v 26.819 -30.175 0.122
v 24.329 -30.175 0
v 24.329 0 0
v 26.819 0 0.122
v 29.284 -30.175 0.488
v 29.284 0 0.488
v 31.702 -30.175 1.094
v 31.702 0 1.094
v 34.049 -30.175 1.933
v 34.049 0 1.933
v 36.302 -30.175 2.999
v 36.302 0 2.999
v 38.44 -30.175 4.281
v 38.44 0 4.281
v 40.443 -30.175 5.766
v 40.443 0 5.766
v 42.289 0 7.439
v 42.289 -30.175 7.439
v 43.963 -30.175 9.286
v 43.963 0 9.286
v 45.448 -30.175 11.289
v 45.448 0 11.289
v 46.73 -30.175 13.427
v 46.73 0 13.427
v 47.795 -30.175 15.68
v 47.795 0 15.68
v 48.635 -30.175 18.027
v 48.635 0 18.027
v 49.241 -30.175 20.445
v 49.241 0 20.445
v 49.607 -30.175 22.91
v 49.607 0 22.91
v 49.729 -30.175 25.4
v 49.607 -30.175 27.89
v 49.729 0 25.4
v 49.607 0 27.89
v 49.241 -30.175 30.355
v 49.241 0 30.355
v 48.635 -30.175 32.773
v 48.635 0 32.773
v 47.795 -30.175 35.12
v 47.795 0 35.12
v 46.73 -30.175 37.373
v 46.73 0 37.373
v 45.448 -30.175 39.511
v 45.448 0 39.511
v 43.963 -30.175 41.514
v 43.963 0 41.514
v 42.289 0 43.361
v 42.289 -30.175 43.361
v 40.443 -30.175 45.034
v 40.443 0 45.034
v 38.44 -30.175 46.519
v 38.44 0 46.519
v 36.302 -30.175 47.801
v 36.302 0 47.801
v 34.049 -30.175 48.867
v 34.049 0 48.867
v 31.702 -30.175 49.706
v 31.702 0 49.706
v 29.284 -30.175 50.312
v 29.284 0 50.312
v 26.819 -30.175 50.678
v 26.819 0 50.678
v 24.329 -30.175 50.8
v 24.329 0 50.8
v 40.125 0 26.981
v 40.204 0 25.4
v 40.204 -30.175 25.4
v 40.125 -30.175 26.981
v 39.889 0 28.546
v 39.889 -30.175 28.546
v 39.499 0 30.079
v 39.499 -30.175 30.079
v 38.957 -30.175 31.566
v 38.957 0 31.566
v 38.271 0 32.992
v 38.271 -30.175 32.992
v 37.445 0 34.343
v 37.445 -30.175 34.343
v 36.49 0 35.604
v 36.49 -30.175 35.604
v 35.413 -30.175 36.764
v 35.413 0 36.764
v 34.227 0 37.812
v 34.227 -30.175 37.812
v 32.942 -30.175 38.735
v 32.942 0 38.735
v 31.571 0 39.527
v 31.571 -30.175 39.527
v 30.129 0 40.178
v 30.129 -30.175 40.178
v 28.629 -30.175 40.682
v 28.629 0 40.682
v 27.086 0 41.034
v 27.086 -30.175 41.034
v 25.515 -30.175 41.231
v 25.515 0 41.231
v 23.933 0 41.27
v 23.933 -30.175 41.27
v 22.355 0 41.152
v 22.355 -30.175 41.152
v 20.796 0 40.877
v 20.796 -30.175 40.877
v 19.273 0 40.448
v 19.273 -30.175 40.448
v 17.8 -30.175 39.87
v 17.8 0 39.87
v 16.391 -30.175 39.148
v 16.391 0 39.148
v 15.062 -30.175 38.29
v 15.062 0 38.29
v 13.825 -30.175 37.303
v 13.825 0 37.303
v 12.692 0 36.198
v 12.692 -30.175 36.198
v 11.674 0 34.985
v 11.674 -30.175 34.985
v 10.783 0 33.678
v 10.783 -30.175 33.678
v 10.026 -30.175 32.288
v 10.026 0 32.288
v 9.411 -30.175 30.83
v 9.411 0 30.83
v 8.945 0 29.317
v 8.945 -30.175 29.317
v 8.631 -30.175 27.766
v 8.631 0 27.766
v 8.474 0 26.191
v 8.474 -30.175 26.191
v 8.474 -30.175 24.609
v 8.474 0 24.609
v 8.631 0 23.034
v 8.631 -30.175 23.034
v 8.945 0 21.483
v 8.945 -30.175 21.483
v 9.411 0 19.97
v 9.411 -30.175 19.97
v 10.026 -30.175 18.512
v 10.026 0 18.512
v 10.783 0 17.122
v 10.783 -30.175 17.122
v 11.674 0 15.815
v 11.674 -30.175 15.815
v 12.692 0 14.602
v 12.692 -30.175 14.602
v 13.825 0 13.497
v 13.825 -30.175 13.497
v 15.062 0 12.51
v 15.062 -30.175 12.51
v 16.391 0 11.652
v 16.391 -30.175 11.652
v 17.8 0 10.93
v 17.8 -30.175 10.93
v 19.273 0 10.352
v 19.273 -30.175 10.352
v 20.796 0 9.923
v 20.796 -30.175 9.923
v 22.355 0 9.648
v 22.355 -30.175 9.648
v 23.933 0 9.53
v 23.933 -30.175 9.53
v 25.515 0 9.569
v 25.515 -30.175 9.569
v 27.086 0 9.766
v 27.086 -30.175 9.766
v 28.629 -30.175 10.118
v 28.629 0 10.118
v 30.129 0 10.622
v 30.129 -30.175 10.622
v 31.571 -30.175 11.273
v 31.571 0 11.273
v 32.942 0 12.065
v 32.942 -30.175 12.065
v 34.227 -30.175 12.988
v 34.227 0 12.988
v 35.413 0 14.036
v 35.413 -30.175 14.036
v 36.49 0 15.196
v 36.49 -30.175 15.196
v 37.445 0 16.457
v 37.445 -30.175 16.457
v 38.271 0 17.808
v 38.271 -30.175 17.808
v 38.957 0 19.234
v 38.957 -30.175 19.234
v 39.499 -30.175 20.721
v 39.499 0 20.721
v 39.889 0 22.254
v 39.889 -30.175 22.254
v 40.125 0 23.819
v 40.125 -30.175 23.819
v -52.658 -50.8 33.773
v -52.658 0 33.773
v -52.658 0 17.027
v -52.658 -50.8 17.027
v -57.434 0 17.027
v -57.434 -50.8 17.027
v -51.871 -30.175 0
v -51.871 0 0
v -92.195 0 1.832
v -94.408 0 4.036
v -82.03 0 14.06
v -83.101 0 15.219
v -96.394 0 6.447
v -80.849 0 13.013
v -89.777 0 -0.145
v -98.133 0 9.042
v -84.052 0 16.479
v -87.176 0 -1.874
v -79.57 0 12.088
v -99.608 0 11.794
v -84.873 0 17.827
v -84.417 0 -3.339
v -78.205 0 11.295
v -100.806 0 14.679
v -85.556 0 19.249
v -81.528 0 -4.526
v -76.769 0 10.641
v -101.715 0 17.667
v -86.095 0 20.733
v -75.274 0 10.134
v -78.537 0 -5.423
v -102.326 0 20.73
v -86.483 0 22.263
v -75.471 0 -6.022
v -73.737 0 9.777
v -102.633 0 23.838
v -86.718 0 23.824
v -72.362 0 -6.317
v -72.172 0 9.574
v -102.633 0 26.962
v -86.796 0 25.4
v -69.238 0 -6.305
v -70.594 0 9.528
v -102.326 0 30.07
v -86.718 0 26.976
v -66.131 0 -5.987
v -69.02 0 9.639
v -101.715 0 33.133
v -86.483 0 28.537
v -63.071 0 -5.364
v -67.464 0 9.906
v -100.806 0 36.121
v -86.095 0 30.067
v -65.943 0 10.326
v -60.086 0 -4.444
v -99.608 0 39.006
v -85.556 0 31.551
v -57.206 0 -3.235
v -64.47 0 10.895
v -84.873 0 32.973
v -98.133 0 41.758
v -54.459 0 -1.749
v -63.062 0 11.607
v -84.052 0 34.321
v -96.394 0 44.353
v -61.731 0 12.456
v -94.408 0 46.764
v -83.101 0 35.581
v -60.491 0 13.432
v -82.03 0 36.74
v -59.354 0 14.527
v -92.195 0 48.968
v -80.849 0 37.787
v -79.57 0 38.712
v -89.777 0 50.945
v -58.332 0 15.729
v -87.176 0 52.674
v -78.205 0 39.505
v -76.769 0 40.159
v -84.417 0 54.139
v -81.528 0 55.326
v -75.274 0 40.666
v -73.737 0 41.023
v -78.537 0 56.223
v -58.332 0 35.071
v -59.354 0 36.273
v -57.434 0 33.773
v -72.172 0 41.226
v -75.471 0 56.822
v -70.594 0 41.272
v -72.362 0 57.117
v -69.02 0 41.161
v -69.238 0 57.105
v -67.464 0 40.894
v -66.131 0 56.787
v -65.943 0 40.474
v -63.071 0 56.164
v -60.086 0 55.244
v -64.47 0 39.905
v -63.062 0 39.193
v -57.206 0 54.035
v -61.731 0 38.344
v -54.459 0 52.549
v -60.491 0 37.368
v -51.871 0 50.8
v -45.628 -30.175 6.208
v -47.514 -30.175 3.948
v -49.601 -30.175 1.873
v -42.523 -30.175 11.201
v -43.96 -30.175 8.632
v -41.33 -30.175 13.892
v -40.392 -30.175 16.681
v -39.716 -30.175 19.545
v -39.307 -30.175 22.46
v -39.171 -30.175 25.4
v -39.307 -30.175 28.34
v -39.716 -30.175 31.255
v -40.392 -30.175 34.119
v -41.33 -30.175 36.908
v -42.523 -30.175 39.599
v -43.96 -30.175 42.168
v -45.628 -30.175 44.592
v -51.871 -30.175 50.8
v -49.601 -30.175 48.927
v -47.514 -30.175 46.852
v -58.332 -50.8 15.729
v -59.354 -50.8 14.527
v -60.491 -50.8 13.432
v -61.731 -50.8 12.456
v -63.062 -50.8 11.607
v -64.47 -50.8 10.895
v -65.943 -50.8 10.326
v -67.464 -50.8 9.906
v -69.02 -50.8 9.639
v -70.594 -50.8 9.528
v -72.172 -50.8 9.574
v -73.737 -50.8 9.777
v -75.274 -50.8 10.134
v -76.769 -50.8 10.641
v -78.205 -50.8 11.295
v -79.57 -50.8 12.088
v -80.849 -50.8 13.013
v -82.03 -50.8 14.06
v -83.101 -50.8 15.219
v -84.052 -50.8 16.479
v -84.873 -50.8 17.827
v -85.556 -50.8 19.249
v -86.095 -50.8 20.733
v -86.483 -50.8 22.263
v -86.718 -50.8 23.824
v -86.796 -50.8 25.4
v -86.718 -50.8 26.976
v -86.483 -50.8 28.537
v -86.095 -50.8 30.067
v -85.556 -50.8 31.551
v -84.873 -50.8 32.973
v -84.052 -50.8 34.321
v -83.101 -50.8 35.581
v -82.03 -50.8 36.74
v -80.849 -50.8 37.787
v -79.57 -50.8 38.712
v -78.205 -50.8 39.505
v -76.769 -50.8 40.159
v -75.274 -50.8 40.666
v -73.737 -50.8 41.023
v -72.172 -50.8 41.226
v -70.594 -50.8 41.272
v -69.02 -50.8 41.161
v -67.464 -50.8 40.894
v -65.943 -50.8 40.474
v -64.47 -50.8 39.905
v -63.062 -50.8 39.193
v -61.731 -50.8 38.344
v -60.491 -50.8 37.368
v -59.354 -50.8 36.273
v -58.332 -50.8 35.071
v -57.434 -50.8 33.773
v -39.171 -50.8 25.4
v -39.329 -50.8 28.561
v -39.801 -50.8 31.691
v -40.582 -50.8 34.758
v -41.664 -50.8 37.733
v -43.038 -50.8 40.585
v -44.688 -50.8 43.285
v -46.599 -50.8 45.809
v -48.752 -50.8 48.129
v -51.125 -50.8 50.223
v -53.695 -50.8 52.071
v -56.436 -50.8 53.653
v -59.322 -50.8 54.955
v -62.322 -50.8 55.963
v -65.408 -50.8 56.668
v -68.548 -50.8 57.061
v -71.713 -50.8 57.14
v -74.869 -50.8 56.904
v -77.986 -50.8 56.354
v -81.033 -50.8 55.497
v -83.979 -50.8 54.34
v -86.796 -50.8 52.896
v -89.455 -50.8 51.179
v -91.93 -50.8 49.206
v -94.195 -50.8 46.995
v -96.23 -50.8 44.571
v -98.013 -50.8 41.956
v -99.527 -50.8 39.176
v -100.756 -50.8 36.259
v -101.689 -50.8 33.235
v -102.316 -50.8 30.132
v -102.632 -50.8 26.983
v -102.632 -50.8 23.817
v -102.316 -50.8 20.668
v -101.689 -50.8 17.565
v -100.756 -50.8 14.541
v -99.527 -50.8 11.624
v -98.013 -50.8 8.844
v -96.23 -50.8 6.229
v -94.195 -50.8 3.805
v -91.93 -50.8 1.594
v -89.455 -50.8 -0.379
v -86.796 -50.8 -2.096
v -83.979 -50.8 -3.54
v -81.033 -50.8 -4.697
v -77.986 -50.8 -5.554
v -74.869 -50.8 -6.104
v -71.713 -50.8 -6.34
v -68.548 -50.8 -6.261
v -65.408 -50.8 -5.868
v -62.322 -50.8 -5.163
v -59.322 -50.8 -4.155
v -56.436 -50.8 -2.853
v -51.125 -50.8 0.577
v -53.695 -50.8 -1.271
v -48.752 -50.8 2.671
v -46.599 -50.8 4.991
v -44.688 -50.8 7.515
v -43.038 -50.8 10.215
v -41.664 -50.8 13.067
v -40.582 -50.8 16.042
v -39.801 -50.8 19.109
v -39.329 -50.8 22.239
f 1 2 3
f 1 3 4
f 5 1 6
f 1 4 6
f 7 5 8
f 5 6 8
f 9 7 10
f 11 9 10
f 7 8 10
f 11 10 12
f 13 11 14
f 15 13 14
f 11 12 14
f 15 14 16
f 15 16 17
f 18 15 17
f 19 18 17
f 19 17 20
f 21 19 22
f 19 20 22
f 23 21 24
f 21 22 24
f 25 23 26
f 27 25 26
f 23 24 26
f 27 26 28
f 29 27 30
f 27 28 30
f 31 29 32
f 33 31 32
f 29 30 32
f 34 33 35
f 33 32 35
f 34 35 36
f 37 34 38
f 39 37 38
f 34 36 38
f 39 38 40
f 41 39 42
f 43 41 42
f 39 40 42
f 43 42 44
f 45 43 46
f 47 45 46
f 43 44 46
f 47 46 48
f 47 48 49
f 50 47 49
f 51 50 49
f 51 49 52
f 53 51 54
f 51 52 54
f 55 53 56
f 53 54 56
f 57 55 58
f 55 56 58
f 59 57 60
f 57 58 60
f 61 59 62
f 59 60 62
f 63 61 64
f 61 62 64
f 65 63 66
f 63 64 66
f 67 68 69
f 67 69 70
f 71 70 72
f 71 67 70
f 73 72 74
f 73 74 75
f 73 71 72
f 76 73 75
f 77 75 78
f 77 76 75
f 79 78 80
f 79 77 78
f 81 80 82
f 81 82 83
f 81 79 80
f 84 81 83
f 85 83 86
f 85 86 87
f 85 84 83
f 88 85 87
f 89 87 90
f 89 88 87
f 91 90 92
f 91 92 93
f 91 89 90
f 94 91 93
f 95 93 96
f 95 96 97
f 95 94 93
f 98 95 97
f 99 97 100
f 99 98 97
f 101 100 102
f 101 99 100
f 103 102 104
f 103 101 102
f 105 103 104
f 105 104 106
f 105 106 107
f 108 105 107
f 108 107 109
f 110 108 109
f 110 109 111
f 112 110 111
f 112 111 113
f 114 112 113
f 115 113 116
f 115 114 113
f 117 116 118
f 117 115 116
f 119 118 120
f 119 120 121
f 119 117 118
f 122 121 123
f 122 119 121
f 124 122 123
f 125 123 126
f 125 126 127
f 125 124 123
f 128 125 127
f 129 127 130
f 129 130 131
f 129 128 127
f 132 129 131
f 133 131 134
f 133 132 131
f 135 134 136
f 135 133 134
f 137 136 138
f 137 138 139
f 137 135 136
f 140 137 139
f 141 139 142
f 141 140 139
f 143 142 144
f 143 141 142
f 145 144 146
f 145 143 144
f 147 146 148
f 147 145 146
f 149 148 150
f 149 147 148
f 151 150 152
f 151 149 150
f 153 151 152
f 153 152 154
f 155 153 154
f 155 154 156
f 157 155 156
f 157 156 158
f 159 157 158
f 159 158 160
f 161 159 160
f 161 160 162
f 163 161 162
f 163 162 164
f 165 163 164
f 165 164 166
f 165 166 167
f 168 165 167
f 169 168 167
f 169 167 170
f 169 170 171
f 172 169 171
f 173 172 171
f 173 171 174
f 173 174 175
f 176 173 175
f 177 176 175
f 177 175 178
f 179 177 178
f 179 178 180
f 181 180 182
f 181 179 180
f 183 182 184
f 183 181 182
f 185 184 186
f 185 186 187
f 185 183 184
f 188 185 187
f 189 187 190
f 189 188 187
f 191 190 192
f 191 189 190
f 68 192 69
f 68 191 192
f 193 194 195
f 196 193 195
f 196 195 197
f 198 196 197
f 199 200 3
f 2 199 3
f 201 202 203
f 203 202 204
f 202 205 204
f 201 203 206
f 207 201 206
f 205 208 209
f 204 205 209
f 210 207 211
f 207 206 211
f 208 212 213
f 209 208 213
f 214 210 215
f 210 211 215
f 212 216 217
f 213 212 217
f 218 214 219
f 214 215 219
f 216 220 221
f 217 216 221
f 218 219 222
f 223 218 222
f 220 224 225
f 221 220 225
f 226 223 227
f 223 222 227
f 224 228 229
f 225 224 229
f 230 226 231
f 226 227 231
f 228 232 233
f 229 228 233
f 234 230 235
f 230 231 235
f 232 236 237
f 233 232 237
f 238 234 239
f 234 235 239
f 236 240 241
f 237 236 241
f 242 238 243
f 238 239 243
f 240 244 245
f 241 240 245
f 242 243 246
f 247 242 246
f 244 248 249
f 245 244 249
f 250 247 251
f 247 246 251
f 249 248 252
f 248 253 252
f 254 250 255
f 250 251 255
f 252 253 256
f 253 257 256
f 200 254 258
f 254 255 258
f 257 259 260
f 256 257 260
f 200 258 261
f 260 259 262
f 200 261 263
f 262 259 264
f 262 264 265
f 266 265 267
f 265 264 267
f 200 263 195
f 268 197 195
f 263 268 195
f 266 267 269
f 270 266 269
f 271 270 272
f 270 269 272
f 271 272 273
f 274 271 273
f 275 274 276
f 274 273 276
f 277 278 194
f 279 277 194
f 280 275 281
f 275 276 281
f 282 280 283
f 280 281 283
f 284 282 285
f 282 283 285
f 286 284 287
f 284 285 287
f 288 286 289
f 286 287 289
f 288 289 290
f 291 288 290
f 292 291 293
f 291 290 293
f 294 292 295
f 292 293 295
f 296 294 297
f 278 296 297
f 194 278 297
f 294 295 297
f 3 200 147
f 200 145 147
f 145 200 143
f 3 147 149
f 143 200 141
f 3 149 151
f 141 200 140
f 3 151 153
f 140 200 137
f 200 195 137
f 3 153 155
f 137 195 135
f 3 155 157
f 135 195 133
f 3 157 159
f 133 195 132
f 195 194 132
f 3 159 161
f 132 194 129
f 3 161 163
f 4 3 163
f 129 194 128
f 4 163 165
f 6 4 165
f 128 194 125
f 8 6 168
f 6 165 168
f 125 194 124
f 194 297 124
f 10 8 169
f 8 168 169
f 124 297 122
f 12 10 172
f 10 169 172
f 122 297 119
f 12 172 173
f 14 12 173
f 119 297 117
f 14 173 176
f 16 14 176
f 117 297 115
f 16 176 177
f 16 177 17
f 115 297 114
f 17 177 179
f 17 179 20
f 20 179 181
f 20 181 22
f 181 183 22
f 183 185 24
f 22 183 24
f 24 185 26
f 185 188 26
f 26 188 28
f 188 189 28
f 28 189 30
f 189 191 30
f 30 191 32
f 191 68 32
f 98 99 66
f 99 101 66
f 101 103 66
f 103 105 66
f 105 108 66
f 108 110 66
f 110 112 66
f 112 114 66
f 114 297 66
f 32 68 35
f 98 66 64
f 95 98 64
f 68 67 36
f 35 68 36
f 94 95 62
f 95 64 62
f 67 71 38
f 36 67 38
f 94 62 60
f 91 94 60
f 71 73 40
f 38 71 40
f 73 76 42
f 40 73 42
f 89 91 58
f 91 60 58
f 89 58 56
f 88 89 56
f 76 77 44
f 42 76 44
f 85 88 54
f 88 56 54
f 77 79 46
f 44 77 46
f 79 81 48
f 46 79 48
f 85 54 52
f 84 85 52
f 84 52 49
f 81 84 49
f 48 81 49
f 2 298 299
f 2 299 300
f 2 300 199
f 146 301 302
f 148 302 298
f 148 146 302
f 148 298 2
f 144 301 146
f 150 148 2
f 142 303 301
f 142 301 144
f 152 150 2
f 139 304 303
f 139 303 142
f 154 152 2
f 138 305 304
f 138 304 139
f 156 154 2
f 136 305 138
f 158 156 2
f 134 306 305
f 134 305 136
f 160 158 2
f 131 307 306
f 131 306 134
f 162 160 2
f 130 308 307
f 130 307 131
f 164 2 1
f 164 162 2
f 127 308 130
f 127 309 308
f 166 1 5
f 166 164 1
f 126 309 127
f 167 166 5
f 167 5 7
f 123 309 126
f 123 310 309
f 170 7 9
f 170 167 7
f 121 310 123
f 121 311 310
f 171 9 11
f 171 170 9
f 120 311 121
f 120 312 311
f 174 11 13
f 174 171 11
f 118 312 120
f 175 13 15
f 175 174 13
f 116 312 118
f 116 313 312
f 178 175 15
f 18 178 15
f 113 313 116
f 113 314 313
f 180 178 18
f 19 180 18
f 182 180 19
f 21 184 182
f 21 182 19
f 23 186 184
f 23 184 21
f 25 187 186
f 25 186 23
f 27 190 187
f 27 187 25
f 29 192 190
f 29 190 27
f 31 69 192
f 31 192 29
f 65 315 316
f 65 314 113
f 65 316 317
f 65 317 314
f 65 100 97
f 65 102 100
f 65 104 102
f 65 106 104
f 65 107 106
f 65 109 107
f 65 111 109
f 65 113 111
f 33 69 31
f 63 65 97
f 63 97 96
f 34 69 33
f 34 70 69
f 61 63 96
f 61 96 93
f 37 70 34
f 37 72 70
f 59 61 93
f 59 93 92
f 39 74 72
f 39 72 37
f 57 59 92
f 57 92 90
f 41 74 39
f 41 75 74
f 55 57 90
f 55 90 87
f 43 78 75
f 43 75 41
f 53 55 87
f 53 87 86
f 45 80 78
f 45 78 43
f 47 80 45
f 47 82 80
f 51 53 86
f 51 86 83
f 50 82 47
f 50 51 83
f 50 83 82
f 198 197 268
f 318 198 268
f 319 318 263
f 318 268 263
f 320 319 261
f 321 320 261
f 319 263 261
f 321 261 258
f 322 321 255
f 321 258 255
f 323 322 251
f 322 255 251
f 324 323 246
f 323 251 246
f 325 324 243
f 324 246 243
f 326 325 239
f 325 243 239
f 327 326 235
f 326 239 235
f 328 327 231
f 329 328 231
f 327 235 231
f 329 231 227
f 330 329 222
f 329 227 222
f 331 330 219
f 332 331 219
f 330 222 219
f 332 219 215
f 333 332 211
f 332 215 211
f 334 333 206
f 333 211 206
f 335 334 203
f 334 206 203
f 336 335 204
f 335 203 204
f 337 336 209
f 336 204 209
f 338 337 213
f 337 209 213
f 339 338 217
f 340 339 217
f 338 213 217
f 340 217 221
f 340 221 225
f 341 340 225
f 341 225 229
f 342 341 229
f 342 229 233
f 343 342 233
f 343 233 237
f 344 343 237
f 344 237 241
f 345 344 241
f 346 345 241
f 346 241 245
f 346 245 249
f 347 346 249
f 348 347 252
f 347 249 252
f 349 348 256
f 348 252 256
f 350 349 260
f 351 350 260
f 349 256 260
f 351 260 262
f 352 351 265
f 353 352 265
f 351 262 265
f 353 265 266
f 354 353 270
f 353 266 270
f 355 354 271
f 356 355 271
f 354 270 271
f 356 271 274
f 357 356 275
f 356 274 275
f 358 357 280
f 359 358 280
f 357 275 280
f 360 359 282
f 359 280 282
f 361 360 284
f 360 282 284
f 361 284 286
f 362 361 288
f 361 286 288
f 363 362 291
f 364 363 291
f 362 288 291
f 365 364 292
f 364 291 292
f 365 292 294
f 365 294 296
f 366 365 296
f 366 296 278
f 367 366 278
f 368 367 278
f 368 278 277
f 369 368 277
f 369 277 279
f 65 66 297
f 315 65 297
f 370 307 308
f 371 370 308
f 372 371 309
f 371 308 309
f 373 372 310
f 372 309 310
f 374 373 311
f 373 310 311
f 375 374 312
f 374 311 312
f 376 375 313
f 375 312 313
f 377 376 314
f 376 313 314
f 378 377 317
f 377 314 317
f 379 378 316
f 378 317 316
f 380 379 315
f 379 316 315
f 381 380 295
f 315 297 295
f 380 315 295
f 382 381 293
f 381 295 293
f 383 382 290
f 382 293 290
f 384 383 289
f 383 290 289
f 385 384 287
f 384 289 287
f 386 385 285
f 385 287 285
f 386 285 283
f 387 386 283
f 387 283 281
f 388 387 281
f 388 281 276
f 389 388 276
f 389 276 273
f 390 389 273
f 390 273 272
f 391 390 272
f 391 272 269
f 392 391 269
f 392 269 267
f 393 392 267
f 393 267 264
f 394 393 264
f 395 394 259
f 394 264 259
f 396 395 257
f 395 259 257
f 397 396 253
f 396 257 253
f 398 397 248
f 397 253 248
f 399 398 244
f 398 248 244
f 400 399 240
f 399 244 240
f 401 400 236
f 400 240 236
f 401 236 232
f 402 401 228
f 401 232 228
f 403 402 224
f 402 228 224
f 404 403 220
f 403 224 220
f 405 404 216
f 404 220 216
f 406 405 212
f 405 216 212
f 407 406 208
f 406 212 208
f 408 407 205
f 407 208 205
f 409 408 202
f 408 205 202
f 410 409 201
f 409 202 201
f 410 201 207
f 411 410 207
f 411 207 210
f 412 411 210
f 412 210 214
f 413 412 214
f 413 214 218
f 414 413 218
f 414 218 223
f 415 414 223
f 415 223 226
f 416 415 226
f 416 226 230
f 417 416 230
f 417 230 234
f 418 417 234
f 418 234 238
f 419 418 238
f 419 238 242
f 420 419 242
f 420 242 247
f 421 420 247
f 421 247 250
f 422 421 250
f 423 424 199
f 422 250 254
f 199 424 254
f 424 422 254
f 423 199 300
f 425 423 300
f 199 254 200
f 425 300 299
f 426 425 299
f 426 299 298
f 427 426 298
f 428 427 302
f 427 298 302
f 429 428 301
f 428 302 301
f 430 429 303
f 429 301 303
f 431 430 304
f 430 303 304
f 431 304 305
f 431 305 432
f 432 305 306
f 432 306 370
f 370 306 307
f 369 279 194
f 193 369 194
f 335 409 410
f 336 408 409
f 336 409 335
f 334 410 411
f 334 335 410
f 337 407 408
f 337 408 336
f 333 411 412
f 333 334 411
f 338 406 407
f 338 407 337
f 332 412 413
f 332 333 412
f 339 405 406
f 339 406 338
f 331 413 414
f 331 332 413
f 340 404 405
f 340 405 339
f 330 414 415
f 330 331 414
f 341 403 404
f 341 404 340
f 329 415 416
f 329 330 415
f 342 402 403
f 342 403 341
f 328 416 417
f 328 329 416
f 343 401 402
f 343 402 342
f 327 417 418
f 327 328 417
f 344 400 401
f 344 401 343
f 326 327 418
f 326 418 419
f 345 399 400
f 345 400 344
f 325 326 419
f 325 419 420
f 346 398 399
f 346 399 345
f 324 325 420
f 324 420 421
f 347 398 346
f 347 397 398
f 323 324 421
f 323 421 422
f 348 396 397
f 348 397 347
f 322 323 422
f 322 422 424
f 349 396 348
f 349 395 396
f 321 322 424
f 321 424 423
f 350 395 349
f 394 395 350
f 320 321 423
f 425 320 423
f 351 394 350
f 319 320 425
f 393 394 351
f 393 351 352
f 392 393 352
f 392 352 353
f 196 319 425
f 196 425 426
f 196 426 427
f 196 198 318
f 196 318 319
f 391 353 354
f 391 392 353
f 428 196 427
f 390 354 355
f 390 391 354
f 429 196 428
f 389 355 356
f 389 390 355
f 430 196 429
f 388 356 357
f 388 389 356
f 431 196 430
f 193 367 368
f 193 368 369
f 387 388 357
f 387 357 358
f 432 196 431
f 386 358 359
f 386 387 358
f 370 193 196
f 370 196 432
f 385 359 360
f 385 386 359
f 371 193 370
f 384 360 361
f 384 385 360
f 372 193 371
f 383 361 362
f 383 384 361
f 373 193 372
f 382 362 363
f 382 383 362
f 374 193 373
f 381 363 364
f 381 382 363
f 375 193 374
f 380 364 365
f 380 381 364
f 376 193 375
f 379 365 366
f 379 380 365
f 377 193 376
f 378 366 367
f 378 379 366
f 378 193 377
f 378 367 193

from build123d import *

# Parameters (mm, degrees)
F0_R     = 15.875
F1_DEPTH = 30.1752
F2_R     = 31.75
F3_DEPTH = 50.8


with BuildPart() as f1:
    # F0 (on Front) → F1 (new body)
    with BuildSketch(Plane.XZ):
        with BuildLine():
            ThreePointArc((-39.171085, 25.4), (-42.523022, 11.200968), (-51.871085, 0))
            Line((-51.871085, 0), (24.328915, 0))
            ThreePointArc((24.328915, 0), (49.728915, 25.4), (24.328915, 50.8))
            Line((24.328915, 50.8), (-51.871085, 50.8))
            ThreePointArc((-51.871085, 50.8), (-42.523022, 39.599032), (-39.171085, 25.4))
        make_face()
        with Locations((24.328915, 25.4)):
            Circle(F0_R, mode=Mode.SUBTRACT)
    extrude(amount=F1_DEPTH)

    # F2 (on Front) → F3 (join)
    with BuildSketch(Plane.XZ):
        with Locations((-70.921085, 25.4)):
            Circle(F2_R)
        with BuildLine():
            ThreePointArc((-57.433685, 17.027087), (-86.796085, 25.4), (-57.433685, 33.772913))
            Line((-57.433685, 33.772913), (-52.658485, 33.772913))
            Line((-52.658485, 33.772913), (-52.658485, 17.027087))
            Line((-52.658485, 17.027087), (-57.433685, 17.027087))
        make_face(mode=Mode.SUBTRACT)
    extrude(amount=F3_DEPTH)


solid = f1.part
